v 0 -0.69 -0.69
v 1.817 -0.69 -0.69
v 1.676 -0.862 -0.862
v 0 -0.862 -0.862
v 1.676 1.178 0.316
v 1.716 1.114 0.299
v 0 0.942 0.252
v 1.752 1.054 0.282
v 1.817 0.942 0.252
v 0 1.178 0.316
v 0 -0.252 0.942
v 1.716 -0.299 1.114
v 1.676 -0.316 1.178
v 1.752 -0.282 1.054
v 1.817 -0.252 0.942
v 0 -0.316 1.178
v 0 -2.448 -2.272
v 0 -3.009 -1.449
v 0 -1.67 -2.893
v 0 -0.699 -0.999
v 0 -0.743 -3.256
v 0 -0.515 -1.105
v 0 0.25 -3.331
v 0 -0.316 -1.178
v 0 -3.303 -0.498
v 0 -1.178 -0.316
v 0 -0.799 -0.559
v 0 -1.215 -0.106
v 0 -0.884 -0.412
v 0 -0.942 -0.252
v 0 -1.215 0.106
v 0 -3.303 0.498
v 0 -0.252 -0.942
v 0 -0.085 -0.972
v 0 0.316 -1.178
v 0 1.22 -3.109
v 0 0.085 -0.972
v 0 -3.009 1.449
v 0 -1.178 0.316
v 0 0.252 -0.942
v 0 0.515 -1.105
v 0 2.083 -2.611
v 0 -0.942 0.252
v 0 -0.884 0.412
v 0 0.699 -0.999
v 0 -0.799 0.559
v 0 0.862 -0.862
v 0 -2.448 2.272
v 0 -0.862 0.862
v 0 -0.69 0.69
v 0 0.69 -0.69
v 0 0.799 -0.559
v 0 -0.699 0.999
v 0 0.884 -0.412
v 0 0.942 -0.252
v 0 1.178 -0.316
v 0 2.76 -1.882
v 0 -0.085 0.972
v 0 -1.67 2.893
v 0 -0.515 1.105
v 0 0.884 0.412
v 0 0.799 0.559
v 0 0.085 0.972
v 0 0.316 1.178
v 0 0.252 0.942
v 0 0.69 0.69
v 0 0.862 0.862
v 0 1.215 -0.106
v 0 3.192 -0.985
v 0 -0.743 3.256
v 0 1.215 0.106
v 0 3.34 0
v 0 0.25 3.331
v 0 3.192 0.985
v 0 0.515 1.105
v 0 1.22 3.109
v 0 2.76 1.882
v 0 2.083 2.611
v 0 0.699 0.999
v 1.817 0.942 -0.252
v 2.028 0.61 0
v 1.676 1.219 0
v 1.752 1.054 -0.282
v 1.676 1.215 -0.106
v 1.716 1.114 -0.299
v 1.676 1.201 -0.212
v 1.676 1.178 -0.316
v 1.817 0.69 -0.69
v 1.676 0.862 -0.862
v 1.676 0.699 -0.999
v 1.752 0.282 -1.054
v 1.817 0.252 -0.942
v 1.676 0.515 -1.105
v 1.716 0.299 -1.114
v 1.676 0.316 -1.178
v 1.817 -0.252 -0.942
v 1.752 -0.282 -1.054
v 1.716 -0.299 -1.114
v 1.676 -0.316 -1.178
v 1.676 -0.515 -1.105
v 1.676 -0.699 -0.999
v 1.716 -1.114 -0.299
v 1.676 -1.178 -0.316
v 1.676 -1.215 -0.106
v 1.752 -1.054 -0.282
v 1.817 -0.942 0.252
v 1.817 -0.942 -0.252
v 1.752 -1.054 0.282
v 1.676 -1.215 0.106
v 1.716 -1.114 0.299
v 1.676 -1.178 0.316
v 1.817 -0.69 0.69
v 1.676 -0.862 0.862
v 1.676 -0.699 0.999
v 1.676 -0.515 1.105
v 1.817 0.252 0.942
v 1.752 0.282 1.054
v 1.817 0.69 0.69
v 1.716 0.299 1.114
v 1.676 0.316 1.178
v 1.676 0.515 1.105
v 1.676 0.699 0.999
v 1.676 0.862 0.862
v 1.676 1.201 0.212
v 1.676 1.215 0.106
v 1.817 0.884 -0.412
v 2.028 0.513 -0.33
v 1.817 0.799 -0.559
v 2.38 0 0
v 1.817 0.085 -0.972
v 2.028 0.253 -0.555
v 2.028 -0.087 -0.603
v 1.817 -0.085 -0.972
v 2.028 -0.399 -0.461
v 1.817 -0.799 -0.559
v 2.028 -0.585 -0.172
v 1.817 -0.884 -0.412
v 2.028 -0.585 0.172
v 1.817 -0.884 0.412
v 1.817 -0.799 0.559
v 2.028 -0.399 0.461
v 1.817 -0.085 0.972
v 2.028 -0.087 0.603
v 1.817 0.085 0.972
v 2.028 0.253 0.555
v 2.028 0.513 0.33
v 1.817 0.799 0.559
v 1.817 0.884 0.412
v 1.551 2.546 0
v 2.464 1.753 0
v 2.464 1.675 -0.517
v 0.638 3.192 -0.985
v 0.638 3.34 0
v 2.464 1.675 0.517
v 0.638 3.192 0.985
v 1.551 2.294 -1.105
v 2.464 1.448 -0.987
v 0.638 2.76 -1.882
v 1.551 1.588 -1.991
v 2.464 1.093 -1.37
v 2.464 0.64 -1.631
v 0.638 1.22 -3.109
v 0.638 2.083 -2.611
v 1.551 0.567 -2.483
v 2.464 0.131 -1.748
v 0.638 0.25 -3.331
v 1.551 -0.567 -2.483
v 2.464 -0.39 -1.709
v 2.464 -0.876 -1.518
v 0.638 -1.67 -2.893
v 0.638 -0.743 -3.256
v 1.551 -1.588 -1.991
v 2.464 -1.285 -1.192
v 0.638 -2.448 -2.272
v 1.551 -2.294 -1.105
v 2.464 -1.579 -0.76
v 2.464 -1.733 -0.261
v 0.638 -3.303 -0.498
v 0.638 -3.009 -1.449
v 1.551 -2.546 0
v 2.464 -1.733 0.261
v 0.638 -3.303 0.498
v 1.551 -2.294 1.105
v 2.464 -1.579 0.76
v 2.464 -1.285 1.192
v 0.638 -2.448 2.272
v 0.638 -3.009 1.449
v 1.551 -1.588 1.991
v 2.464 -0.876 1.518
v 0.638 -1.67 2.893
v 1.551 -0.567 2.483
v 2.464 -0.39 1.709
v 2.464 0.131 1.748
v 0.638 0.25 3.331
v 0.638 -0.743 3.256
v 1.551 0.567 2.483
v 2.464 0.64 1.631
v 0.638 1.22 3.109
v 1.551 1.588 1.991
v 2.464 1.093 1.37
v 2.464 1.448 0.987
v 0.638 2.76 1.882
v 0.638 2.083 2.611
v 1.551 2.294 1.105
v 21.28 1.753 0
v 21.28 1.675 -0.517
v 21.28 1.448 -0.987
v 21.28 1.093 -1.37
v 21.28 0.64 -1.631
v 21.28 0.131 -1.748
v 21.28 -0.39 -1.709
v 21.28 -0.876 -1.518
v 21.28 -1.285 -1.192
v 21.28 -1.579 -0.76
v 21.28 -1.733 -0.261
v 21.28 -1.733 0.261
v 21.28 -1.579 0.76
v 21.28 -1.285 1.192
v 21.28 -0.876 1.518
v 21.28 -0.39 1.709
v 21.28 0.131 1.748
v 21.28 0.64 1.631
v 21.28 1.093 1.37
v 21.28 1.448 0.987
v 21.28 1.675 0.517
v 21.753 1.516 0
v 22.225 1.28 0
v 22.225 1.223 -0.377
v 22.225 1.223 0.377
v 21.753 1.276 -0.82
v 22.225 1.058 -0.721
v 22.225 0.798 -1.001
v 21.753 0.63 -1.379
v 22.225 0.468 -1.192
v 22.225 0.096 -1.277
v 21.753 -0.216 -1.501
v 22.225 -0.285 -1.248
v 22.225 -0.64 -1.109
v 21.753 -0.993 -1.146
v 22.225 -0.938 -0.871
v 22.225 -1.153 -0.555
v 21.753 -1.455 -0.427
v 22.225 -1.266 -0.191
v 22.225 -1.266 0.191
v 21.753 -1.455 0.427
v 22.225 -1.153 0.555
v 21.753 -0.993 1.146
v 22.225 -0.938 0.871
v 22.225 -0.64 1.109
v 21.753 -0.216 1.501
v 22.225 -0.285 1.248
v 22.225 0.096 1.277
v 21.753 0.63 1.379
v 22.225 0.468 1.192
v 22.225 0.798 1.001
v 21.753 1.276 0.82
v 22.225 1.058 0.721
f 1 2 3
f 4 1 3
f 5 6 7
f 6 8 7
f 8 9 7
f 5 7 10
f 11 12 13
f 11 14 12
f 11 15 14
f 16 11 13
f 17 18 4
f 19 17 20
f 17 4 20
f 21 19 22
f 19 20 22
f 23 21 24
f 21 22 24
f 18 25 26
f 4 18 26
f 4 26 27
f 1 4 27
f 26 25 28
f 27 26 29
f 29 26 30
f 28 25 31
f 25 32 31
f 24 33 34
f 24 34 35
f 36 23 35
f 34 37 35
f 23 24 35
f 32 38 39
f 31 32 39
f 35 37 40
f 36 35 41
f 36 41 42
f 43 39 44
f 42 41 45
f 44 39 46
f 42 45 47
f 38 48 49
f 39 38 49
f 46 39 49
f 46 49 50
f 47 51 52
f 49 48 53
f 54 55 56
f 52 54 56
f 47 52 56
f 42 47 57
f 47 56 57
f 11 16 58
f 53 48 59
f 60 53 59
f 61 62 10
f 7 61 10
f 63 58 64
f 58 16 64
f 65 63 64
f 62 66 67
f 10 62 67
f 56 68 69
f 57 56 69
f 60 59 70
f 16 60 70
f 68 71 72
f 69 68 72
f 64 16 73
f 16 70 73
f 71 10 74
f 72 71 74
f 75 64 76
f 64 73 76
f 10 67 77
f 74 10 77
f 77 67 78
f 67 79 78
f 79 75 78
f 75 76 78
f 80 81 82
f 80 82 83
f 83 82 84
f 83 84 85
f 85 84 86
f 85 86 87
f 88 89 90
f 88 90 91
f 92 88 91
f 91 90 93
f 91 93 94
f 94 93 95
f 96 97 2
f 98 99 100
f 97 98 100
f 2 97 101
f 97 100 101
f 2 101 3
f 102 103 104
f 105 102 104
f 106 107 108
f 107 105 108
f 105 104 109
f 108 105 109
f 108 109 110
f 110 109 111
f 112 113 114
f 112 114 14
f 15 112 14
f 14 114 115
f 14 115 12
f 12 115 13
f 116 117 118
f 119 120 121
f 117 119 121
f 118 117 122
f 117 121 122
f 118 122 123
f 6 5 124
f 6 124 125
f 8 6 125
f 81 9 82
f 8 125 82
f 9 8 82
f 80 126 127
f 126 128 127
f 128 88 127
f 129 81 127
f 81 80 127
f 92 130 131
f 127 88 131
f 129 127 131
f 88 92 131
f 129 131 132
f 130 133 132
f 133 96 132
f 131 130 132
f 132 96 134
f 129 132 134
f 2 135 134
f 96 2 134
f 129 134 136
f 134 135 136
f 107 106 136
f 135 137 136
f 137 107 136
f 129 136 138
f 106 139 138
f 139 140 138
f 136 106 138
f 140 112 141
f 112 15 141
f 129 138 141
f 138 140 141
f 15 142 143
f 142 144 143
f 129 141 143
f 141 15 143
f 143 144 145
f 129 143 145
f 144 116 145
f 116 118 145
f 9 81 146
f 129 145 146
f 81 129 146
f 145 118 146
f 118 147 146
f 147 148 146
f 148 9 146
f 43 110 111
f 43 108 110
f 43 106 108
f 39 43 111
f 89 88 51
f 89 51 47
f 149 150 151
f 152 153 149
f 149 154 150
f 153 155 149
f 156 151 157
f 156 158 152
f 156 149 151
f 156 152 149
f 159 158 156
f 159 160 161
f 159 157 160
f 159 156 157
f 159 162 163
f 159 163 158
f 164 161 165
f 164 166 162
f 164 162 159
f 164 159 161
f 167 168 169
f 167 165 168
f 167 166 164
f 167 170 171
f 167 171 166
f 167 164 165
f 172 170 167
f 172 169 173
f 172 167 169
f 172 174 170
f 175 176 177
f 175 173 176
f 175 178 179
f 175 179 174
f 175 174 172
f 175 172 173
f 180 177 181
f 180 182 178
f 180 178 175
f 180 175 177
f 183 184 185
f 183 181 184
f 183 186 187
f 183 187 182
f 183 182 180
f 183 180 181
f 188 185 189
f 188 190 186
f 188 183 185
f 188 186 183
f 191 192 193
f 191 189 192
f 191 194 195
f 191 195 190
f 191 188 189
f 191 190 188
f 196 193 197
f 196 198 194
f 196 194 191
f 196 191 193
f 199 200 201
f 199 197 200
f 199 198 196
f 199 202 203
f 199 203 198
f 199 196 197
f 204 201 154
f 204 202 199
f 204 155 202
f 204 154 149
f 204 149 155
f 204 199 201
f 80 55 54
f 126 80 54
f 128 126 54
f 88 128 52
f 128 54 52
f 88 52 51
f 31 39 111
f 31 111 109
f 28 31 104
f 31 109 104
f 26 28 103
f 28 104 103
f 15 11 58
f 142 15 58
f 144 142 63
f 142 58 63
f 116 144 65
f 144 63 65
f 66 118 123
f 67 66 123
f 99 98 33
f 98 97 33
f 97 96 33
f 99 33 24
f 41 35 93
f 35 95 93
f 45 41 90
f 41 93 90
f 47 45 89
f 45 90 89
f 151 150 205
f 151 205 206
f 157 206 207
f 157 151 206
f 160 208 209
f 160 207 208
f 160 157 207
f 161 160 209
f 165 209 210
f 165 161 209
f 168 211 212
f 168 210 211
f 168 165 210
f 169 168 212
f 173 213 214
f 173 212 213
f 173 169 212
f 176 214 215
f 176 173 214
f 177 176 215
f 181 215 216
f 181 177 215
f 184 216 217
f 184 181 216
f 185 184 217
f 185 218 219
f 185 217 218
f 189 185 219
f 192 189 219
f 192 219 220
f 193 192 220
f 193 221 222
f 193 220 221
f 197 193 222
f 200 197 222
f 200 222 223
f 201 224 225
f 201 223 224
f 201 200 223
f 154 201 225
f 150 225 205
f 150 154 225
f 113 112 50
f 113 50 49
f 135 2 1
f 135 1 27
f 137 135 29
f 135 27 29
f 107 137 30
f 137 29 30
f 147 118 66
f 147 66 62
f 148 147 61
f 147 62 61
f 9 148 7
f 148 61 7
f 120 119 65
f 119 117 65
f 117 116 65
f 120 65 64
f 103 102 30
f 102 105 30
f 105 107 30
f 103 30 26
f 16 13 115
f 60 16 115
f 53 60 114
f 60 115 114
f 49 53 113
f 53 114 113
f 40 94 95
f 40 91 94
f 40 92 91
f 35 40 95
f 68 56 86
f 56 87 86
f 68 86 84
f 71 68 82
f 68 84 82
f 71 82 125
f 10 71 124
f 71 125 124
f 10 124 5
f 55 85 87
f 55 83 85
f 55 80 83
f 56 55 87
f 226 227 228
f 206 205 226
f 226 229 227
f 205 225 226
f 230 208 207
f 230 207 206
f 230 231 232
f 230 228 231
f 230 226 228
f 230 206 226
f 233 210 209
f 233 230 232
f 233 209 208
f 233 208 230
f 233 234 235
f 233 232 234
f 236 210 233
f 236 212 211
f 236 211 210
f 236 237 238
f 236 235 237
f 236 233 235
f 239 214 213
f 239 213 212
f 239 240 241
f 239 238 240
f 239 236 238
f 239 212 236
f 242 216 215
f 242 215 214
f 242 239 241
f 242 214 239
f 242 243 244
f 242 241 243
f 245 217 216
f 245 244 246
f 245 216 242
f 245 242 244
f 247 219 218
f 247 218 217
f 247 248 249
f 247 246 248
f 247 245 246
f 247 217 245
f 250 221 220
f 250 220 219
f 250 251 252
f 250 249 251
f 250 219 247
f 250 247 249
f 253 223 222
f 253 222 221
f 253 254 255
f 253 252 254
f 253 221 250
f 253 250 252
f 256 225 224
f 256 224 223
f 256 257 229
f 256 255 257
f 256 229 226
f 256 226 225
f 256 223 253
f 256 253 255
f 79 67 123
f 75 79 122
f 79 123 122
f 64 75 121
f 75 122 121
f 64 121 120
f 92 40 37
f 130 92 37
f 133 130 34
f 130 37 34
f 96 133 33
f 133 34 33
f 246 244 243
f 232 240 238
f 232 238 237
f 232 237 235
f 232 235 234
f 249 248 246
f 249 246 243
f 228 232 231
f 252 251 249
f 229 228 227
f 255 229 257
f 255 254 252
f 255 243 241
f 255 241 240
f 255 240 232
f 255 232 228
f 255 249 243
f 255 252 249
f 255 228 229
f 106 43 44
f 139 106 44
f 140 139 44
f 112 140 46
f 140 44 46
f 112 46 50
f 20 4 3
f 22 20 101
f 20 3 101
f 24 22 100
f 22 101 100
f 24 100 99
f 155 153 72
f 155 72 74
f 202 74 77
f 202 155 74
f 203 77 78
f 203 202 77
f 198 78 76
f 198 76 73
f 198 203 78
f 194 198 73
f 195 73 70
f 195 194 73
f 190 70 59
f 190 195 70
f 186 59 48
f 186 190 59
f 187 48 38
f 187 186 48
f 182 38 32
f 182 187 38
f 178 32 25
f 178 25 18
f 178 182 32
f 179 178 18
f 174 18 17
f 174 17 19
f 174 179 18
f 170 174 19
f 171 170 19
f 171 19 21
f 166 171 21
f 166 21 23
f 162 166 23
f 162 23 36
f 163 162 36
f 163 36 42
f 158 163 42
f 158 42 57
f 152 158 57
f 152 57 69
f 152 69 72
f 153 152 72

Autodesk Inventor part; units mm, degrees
ref_plane "YZ Plane" through (0, 0, 0) normal (1, 0, 0) x (0, 1, 0)
ref_plane "XZ Plane" through (0, 0, 0) normal (0, 1, 0) x (-1, 0, 0)
sketch "Sketch1" plane through (0, 0, 0) normal (0, 0, 1) x (1, 0, 0)
  line L0 (22.225, 0) -> (22.225, 1.7526)
  line L1 (22.225, 1.7526) -> (2.4638, 1.7526)
  line L2 (0, 3.3401) -> (0, 1.2192)
  line L3 (0, 1.2192) -> (1.6764, 1.2192)
  line L4 (1.6764, 1.2192) -> (2.3803, 0)
  line L5 (2.3803, 0) -> (22.225, 0)
  line L6 (0, 3.3401) -> (0.6376, 3.3401)
  line L7 (0.6376, 3.3401) -> (2.4638, 1.7526)
  line L8 (-4.445, 0) -> (26.67, 0) projected
  line L9 (0, -0.668) -> (0, 4.0081) projected
  dimension "d0" = 22.225
  dimension "d1" = 1.6764
  dimension "d2" = 3.5052
  dimension "d3" = 2.4638
  dimension "d4" = 41
  dimension "d5" = 2.4384
  dimension "d6" = 60
  dimension "d7" = 6.6802
revolve "Body" add sketch "Sketch1" angle 360 about axis through (2.3803, 0, 0) along (1, 0, 0) contours L5 L4 L3 L2 L6 L7 L1 L0
sketch "Sketch2" plane through (0, 0, 0) normal (-1, 0, 0) x (0, 0, 1)
  circle A0 centre (0, 0) radius 3.3401 projected
  circle A1 centre (0, 0) radius 1.2192 projected
  line L0 (0.9421, 0.2524) -> (1.1777, 0.3156)
  line L1 (0.9421, -0.2524) -> (1.1777, -0.3156)
  arc A2 (0.9421, -0.2524) -> (0.9421, 0.2524) centre (0, 0) ccw
  arc A3 (1.1777, -0.3156) -> (1.1777, 0.3156) centre (0, 0) ccw
  line L2 (0, -4.6761) -> (0, 4.6761) projected
  line L3 (-4.6761, 0) -> (4.6761, 0) projected
  line L4 (0.9421, 0.2524) -> (0, 0) construction
  line L5 (0, 0) -> (0.9421, -0.2524) construction
  line L6 (0.2524, 0.9421) -> (0.3156, 1.1777)
  line L7 (0.6897, 0.6897) -> (0.8621, 0.8621)
  arc A4 (0.6897, 0.6897) -> (0.2524, 0.9421) centre (0, 0) ccw
  arc A5 (0.8621, 0.8621) -> (0.3156, 1.1777) centre (0, 0) ccw
  line L8 (-0.6897, 0.6897) -> (-0.8621, 0.8621)
  line L9 (-0.2524, 0.9421) -> (-0.3156, 1.1777)
  arc A6 (-0.2524, 0.9421) -> (-0.6897, 0.6897) centre (0, 0) ccw
  arc A7 (-0.3156, 1.1777) -> (-0.8621, 0.8621) centre (0, 0) ccw
  line L10 (-0.9421, -0.2524) -> (-1.1777, -0.3156)
  line L11 (-0.9421, 0.2524) -> (-1.1777, 0.3156)
  arc A8 (-0.9421, 0.2524) -> (-0.9421, -0.2524) centre (0, 0) ccw
  arc A9 (-1.1777, 0.3156) -> (-1.1777, -0.3156) centre (0, 0) ccw
  line L12 (-0.2524, -0.9421) -> (-0.3156, -1.1777)
  line L13 (-0.6897, -0.6897) -> (-0.8621, -0.8621)
  arc A10 (-0.6897, -0.6897) -> (-0.2524, -0.9421) centre (0, 0) ccw
  arc A11 (-0.8621, -0.8621) -> (-0.3156, -1.1777) centre (0, 0) ccw
  line L14 (0.6897, -0.6897) -> (0.8621, -0.8621)
  line L15 (0.2524, -0.9421) -> (0.3156, -1.1777)
  arc A12 (0.2524, -0.9421) -> (0.6897, -0.6897) centre (0, 0) ccw
  arc A13 (0.3156, -1.1777) -> (0.8621, -0.8621) centre (0, 0) ccw
  dimension "d8" = 1.9507
  dimension "d9" = 2.4384
  dimension "d10" = 15
  dimension "d11" = 15
  dimension "d22" = 360
extrude "Slot" add sketch "Sketch2" against normal up to next contours L3 A2 L0 A1 | A1 L1 A2 L3 | L3 A8 L10 A1 | A1 L11 A8 L3 | A1 L7 A4 L6 | L9 A6 L8 A1 | A1 L13 A10 L12 | L15 A12 L14 A1
thread "Thread" size "6-32 UNC" class "2A" standard "ANSI Unified Screw Threads" length 17.777
chamfer "Chamfer1" distance 0.4724 distance2 0.9449 1 edges at (22.225, -1.7526, 0) measured on face at (22.225, -0.4543, 0.2476)
ref_plane "Work Plane1" through (66.6877, 0, 0) normal (0, 0, -1) x (1, 0, 0)
equation "\"d0\" = NLG"
equation "\"d1\" = INTI"
equation "\"d2\" = GD"
equation "\"d3\" = KOH"
equation "\"d4\" = 0.5 * SEWI"
equation "\"d5\" = SW"
equation "\"d7\" = KOD"
equation "\"d8\" = 0.8 * SW"
equation "\"d9\" = SW"
equation "\"d15\" = GEL"
equation "\"d17\" = -0.5 * SPD + 0.5 * GD"
equation "\"d18\" = GUL"
equation "\"NLG\" = 22.225"
equation "\"SW\" = 2.4384"
equation "\"INTI\" = 1.6764"
equation "\"GEL\" = 17.77695"
equation "\"KOH\" = 2.4638"
equation "\"KOD\" = 6.6802"
equation "\"GUL\" = 0.94488"
equation "\"SPD\" = 2.56032"
equation "\"GD\" = NND"
equation "\"SEWI\" = 82deg"
equation "\"TOA\" = 30deg"
equation "\"GD1\" = SPD"
equation "\"EPV\" = 4.4794"
equation "\"THREADDIA\" = 3.5052"
equation "\"BDM\" = NND"
equation "\"NND\" = 3.5052"
equation "\"GAL\" = 1.9845"
equation "\"E0\" = 1.155 * SW"
properties part number "ANSI B18.3 - 6-32 UNC x 0.875, SSFCHCSI" material "Steel, Mild"
